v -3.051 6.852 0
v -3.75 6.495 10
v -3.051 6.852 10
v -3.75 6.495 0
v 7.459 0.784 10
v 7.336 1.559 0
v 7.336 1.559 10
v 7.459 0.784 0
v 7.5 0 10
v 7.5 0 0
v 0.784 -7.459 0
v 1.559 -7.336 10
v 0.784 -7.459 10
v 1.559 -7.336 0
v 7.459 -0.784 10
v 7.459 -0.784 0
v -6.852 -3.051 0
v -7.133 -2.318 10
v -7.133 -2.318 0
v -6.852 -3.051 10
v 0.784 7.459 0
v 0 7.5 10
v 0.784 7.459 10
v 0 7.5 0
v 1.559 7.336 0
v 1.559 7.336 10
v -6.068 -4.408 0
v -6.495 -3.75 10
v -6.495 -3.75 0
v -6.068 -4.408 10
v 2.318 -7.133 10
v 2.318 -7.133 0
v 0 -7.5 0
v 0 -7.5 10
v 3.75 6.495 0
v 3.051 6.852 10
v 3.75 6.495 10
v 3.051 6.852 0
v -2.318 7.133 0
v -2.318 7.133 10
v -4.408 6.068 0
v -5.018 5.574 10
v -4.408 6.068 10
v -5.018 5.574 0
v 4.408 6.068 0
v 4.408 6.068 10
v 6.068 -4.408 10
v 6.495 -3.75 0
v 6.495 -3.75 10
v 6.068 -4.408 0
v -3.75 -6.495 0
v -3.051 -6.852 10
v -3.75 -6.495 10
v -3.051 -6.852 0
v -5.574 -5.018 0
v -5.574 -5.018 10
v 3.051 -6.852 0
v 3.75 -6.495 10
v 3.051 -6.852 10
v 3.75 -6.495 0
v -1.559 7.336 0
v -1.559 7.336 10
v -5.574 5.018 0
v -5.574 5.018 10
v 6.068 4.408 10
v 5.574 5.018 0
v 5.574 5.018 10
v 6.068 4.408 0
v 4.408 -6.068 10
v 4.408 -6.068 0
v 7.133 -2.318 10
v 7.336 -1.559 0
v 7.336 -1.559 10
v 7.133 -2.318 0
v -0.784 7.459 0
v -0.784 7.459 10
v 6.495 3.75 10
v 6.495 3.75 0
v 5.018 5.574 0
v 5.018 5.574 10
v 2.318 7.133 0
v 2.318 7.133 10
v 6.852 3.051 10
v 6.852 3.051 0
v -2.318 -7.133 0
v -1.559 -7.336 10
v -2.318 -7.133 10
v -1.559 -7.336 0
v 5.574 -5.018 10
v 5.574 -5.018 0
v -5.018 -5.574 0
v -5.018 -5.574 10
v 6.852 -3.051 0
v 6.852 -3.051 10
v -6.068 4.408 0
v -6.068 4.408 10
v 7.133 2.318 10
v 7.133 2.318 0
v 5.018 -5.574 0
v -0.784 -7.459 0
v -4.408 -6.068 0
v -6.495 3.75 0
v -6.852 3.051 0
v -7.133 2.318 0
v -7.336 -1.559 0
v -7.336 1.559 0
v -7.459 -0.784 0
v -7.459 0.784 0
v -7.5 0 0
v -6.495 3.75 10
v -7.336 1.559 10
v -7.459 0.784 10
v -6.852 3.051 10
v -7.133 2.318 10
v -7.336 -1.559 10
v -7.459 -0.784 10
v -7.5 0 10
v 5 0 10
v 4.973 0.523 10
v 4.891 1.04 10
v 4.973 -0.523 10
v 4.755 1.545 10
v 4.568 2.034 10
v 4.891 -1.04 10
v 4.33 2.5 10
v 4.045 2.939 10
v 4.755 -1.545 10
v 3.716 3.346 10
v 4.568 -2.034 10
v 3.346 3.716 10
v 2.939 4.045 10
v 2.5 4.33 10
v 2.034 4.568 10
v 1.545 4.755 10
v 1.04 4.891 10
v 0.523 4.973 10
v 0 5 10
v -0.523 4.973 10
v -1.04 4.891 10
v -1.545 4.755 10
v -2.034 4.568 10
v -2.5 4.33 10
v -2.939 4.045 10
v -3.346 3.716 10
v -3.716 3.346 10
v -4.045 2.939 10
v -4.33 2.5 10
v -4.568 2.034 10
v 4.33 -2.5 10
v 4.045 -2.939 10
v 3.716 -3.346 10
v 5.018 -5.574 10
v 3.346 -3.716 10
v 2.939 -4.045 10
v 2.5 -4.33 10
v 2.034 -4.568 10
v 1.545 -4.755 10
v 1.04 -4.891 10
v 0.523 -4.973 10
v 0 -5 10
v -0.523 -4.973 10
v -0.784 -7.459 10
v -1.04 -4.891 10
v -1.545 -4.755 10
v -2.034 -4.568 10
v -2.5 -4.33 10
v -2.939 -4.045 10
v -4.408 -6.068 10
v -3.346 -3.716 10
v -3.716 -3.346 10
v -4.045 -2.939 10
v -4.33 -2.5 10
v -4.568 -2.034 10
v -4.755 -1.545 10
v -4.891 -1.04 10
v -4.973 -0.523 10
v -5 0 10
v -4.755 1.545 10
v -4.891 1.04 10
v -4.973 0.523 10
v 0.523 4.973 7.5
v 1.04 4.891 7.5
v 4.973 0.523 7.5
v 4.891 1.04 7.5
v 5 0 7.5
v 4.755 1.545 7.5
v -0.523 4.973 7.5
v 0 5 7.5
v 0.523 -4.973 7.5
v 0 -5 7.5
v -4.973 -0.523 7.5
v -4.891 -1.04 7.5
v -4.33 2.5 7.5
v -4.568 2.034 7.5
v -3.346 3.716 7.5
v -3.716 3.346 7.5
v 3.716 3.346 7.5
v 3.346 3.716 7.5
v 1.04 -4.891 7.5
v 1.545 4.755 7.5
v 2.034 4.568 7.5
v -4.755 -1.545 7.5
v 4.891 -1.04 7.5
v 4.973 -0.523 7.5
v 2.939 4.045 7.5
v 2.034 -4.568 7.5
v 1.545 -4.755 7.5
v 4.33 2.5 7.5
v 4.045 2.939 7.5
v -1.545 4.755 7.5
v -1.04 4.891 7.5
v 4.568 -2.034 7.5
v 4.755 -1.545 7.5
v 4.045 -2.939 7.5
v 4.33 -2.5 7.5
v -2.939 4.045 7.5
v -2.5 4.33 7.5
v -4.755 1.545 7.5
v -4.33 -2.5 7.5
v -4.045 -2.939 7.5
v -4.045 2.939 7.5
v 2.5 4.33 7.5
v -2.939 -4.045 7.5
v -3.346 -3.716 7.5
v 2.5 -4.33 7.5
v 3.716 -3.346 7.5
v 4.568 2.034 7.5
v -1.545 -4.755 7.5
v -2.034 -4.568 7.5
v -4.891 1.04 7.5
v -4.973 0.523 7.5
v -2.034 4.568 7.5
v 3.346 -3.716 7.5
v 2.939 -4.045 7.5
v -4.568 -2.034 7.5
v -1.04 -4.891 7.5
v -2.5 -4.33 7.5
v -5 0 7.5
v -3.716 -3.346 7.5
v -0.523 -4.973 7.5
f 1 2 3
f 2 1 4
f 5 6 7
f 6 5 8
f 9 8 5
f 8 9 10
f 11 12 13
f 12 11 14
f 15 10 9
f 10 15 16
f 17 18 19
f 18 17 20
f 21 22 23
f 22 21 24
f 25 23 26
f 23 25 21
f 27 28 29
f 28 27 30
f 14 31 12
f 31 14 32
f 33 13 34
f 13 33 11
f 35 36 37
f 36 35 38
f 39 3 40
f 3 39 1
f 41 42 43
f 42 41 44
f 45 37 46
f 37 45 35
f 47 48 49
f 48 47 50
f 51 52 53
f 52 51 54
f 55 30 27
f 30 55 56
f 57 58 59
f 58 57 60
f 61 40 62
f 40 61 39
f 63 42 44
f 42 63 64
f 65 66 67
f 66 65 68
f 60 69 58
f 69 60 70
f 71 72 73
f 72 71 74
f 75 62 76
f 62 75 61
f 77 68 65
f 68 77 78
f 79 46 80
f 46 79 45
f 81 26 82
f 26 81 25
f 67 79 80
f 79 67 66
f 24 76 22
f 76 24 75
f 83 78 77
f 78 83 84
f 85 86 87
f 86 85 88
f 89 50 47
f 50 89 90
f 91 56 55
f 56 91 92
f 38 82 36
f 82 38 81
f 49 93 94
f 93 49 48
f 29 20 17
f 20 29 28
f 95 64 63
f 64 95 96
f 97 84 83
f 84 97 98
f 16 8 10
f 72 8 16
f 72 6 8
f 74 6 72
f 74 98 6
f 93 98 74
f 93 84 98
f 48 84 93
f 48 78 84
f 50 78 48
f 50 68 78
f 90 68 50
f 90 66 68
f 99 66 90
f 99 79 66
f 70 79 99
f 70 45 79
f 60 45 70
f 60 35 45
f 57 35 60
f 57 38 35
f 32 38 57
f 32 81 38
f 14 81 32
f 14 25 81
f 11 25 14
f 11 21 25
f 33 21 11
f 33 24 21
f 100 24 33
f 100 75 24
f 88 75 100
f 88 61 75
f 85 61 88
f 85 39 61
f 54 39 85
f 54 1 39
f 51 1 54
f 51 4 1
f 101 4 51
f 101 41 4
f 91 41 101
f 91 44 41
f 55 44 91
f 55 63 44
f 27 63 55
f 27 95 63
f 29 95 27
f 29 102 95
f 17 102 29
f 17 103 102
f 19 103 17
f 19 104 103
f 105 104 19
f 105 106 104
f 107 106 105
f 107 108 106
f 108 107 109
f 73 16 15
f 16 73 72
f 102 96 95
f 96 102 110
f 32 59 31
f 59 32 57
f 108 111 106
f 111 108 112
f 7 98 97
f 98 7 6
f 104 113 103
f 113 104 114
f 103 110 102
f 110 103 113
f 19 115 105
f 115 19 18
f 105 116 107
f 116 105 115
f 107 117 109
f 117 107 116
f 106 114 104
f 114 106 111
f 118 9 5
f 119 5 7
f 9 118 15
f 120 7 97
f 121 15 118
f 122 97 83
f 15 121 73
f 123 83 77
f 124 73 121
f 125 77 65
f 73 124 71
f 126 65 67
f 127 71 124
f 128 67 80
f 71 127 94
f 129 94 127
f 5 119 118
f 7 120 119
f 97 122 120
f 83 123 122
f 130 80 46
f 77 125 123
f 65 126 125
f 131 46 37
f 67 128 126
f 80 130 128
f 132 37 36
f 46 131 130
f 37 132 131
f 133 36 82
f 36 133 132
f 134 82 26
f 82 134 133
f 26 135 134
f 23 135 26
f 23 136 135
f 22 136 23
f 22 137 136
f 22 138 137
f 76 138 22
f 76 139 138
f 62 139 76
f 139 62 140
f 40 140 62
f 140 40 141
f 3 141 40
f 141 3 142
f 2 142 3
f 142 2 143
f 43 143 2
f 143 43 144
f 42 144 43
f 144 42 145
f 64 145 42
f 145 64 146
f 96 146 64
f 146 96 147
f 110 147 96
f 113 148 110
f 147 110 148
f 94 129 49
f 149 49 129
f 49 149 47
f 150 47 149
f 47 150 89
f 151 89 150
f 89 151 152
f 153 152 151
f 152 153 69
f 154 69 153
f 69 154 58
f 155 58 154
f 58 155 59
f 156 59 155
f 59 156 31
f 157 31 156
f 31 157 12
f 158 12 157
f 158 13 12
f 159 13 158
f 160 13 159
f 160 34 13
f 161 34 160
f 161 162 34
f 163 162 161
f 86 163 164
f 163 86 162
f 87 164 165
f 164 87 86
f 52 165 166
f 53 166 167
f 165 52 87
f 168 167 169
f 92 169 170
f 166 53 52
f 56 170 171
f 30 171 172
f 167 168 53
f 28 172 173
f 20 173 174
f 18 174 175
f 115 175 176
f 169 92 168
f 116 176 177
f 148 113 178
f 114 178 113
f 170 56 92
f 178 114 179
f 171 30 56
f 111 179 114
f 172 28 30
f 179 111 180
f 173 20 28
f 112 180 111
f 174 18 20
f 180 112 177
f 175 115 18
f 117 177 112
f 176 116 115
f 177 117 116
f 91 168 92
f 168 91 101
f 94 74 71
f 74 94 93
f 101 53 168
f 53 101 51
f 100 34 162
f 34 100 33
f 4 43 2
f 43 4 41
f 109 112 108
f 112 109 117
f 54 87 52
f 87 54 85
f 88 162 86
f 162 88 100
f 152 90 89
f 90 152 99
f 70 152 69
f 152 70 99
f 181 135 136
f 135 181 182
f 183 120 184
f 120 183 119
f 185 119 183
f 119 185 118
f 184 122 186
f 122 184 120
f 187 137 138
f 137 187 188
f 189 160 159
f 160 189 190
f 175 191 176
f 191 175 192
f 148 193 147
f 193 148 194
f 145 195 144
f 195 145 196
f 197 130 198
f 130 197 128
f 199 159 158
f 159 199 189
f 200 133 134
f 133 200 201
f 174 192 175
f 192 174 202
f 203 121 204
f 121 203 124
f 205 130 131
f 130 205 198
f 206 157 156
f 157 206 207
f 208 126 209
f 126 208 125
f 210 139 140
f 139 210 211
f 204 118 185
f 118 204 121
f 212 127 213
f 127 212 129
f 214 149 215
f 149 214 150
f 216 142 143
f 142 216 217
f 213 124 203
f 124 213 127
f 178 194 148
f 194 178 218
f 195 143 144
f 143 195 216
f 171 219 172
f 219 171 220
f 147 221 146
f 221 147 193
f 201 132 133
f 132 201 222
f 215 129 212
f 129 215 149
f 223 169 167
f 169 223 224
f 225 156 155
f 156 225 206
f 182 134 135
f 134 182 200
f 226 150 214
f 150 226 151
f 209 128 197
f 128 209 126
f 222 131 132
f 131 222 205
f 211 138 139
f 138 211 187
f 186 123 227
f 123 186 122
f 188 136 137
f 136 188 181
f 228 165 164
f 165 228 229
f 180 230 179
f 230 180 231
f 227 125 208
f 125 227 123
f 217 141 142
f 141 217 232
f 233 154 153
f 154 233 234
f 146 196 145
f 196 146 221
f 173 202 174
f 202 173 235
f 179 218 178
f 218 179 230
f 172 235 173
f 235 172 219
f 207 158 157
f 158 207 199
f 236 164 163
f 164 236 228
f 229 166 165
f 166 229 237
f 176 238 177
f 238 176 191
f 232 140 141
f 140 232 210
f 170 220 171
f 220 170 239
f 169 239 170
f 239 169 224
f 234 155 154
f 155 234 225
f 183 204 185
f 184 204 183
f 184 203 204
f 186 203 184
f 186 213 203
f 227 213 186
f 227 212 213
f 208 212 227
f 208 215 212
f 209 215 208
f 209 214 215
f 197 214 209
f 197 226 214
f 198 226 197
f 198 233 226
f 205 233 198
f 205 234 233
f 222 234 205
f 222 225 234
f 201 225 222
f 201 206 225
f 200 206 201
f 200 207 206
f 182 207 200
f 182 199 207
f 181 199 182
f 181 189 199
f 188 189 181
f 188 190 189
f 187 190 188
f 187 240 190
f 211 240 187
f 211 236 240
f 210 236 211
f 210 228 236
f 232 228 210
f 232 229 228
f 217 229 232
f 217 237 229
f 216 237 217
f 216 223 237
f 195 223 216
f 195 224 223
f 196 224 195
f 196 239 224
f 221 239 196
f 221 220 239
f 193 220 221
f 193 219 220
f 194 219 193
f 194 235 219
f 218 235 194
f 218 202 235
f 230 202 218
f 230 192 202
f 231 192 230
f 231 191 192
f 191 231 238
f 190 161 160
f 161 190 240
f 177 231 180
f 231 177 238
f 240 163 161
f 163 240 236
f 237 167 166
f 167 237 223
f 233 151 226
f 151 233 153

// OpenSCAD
difference() {
  cylinder(r=7.5, h=10, center=false, $fn=60);
  translate([0,0,7.5]) cylinder(r=5, h=3, center=false, $fn=60);
}
